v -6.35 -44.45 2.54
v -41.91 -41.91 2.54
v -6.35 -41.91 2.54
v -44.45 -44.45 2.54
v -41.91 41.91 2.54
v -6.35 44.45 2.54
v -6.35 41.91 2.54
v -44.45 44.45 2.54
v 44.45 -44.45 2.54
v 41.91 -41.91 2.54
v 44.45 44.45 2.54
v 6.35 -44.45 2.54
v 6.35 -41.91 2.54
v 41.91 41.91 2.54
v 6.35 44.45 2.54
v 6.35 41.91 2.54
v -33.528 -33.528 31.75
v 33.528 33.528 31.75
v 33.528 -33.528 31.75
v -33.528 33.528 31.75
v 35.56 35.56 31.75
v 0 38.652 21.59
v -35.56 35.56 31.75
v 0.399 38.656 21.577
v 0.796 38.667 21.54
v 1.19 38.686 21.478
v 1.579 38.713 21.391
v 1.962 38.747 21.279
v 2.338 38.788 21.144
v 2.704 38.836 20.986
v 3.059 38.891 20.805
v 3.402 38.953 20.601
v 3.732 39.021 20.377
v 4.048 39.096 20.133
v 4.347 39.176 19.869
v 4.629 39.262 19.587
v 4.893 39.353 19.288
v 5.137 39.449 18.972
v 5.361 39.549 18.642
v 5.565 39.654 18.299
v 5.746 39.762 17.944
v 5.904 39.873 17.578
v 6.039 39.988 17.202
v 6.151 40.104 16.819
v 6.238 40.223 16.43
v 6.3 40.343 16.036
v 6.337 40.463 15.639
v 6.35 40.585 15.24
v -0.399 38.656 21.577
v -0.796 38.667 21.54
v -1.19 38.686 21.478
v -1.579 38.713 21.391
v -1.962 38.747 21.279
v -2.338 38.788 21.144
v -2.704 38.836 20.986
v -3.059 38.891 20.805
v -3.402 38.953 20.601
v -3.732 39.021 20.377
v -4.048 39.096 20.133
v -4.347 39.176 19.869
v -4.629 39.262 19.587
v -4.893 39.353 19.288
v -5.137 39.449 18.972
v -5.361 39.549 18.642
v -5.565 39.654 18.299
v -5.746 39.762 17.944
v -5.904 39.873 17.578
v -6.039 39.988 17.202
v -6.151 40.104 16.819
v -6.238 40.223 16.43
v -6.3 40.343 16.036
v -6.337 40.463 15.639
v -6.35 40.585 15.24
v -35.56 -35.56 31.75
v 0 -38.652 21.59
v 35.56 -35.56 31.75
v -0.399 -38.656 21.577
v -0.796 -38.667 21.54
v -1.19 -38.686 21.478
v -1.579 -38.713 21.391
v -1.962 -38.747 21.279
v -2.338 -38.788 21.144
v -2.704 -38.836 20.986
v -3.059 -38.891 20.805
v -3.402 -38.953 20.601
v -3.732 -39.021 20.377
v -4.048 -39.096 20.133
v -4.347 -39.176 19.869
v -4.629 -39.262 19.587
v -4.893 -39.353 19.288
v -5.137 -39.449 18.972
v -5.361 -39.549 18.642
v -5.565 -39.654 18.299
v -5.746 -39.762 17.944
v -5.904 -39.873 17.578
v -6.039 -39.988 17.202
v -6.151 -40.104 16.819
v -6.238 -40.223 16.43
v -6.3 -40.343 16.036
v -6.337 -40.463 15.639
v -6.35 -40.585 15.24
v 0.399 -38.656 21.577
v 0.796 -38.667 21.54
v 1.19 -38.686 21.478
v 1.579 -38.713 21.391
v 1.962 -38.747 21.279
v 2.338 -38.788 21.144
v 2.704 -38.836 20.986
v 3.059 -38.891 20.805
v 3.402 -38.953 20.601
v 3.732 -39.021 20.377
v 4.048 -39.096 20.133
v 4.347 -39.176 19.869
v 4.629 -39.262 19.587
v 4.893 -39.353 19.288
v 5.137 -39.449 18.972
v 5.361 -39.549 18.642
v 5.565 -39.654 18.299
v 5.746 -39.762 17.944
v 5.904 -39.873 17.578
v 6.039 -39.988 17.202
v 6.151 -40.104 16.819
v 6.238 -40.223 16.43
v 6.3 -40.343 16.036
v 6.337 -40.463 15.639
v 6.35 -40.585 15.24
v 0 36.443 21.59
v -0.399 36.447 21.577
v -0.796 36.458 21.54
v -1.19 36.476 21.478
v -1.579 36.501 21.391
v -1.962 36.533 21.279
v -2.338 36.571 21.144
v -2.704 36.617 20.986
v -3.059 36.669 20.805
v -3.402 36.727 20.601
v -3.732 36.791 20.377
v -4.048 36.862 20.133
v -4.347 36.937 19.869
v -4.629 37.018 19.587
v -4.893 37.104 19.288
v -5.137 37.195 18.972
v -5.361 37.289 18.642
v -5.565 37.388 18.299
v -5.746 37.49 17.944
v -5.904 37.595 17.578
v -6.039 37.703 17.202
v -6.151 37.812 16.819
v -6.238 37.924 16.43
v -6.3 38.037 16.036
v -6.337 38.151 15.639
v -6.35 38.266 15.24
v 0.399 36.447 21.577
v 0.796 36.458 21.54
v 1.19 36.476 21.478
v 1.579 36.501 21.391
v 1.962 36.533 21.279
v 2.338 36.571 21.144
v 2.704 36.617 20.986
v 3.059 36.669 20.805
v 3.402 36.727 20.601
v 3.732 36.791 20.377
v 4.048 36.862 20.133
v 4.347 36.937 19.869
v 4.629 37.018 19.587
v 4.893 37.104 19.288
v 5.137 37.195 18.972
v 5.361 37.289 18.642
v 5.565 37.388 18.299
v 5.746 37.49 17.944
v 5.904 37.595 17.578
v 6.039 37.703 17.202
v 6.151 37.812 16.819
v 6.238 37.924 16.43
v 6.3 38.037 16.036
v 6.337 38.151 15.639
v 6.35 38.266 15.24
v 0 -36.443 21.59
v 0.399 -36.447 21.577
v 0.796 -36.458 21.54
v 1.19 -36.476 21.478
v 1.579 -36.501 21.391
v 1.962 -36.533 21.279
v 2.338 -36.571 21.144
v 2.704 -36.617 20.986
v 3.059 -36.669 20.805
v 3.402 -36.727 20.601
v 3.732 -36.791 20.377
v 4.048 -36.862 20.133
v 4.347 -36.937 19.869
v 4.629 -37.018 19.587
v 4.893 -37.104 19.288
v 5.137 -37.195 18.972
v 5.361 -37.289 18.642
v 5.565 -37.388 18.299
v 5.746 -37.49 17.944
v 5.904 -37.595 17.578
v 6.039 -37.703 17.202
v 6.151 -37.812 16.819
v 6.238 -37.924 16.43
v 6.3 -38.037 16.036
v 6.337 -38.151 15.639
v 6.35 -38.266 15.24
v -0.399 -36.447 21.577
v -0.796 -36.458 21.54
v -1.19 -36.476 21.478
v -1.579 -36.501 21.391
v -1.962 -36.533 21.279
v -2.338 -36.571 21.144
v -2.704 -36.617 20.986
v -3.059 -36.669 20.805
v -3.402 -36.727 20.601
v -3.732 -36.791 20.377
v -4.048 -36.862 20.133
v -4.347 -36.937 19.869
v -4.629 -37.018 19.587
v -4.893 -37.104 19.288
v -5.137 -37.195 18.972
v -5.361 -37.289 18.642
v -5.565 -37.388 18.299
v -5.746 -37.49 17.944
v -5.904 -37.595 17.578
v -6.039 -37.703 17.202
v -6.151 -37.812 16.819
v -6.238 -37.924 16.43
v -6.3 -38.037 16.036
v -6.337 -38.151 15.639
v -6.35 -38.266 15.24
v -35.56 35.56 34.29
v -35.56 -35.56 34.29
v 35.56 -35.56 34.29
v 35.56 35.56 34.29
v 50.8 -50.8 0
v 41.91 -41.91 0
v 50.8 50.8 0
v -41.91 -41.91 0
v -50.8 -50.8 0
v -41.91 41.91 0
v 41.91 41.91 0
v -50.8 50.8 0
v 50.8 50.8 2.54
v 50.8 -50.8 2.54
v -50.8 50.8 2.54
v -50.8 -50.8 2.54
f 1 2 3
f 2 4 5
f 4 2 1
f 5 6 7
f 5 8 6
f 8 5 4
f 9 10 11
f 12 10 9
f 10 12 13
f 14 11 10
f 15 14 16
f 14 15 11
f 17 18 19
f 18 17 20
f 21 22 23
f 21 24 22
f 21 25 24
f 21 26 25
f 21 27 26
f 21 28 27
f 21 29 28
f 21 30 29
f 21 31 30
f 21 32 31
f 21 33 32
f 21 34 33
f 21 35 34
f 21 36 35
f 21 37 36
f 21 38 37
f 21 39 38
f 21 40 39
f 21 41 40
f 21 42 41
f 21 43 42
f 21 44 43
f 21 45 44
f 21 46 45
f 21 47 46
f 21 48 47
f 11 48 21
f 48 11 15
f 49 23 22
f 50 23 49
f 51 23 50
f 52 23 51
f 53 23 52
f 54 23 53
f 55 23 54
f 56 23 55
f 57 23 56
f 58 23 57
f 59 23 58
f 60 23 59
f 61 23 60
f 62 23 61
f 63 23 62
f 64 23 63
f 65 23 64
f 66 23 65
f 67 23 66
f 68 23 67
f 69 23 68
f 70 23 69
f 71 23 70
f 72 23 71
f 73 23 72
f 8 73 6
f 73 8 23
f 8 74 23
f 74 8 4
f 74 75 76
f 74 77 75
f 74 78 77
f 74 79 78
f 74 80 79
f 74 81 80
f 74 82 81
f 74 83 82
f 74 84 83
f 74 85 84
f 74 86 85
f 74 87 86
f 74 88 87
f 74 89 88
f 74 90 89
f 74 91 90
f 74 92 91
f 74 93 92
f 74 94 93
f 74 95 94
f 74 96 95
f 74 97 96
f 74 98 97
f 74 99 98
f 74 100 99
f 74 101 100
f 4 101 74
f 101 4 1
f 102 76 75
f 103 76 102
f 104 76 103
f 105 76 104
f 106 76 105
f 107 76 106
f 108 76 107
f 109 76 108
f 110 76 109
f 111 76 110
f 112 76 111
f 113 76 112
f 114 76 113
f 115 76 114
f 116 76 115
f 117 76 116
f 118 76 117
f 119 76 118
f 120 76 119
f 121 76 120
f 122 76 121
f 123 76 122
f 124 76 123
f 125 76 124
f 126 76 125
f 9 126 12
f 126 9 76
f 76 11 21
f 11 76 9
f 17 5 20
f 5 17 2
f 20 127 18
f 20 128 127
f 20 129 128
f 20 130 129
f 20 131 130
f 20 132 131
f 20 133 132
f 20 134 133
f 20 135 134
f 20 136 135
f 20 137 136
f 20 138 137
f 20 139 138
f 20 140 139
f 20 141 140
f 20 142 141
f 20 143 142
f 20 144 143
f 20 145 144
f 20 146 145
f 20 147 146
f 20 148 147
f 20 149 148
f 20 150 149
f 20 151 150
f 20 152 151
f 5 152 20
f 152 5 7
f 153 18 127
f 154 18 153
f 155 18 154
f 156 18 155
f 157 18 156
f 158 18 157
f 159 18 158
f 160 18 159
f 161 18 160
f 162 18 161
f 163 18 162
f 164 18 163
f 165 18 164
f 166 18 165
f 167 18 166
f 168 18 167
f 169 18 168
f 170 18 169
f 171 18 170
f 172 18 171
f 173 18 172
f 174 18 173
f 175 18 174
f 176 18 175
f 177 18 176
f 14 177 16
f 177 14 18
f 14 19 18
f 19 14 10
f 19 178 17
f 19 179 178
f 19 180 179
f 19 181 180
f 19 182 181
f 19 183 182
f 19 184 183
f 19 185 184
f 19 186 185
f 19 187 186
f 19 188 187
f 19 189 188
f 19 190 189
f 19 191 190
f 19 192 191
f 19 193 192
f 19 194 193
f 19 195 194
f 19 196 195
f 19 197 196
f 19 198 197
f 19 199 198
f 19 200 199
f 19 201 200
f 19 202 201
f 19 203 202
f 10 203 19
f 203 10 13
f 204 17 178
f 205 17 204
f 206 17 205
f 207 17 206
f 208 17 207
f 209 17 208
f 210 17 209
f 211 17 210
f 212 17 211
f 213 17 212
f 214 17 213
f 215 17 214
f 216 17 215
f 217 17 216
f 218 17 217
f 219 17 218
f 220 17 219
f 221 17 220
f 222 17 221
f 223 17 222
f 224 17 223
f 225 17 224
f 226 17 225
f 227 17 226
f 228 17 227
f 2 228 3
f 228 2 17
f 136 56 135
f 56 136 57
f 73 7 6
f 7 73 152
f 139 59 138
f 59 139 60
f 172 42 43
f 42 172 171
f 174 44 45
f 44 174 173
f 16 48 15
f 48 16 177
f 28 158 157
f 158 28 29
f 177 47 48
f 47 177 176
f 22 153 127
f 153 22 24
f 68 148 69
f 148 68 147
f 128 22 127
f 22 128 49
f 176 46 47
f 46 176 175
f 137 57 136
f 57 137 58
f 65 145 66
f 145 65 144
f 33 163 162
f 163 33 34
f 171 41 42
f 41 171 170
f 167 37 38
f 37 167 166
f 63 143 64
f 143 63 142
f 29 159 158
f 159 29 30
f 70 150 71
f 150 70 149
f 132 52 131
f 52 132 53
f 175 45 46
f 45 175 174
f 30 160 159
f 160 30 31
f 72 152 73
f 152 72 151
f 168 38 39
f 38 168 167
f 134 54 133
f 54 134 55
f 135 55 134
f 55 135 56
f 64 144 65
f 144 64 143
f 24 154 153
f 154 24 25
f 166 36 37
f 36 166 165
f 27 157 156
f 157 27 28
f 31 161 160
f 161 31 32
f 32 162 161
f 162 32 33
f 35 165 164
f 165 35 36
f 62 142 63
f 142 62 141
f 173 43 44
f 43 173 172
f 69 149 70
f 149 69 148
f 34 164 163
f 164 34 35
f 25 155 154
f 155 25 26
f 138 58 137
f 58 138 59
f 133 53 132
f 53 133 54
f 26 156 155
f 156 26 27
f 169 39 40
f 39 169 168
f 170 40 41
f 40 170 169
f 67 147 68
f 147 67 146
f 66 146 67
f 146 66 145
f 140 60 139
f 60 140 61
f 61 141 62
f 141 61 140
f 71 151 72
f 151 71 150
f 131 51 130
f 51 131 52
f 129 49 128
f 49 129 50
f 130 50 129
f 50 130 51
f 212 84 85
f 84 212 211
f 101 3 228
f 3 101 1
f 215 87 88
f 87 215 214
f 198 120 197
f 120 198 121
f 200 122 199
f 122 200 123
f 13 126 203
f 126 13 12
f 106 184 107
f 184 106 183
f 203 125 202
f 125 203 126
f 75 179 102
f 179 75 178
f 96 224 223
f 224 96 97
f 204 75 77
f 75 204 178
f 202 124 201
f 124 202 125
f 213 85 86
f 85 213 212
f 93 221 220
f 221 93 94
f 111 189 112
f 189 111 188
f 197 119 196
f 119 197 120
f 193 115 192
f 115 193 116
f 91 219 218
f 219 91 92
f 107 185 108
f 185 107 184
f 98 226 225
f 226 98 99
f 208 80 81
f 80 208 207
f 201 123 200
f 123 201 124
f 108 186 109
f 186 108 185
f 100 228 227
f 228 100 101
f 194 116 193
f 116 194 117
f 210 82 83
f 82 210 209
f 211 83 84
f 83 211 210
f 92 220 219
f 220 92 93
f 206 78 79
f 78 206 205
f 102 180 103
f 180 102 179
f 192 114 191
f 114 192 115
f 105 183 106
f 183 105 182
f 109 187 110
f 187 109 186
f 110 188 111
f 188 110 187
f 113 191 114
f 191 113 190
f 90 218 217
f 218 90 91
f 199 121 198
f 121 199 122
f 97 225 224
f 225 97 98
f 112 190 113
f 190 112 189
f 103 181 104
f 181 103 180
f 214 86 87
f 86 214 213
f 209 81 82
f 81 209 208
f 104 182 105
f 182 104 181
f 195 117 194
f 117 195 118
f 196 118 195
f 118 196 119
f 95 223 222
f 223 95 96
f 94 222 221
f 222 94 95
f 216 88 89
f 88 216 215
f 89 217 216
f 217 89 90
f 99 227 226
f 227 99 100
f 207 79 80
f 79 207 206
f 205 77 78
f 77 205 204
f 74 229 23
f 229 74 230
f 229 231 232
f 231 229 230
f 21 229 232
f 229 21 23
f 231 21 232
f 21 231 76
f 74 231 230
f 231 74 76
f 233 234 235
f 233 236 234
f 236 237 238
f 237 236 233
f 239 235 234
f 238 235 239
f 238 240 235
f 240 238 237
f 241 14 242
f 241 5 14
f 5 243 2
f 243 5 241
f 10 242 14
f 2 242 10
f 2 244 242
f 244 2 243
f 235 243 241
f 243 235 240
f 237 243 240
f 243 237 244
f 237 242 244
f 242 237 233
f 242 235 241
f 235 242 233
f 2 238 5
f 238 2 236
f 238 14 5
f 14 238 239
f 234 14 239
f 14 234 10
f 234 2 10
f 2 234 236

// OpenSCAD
// file: constants.scad
/* GENERAL */

UNIT = 25.4; // 25.4 for in - 1 for mm
$FN = 100;

/* COVER */

COVER_BASE_WIDTH = 4 * UNIT;
COVER_BASE_LENGTH = 4 * UNIT;
COVER_BASE_THICKNESS = 0.1 * UNIT;

COVER_HEIGHT = 1.25 * UNIT;
COVER_TOP_SCALE = 0.8;

COVER_HORIZONTAL_PADDING = 0.5 * UNIT;
COVER_VERTICAL_PADDING = 0.5 * UNIT;

/* LEVEL */

LEVEL_HORIZONTAL_PADDING = 0.5 * UNIT;
LEVEl_VERTICAL_PADDING = 0.5 * UNIT;

/* RISERS */

RISER_LENGTH = LEVEl_VERTICAL_PADDING;
// main file
include <constants.scad>;

module cover_shape(w, l) {
  resize([w, l]) {
    square([1, 1], center=true);
    *circle(d=1, center=true, $fn=$FN);
  }
}

module cover_base(w, l, t, iw, il, it) {
  translate([0, 0, t/2]) linear_extrude(t, center=true) difference() {
    square([w, l], center=true);
    cover_shape(iw-2*it, il-2*it, t);
  }
}

module cover_slot(w, l, h) {
  rotate(a=90, v=[1, 0, 0]) linear_extrude(h, center=true) translate([-w/2, 0, 0]) hull() {
    square([w, l/2]);
    translate([w/2, (l-w/2), 0]) circle(d=w, $fn=$FN);
  }
}

module cover_mid(ow, ol, wt, h, scale) {
  linear_extrude(h, scale=scale) {
    difference() {
      cover_shape(ow, ol);
      offset(r=-wt) cover_shape(ow, ol);
    }
  }
}

module cover_top(iw, il, ot, ih, is) {
  translate([0, 0, ih]) linear_extrude(ot) cover_shape(iw*is, il*is);
}

/*
Generates the `cover` part of the esc enclosure assembly.

@param    decimal   ow    the outer width (bounding box) of cover
@param    decimal   ol    the outer length (bounding box) of cover
@param    decimal   ihp   the inner horizontal padding of cover
@param    decimal   ivp   the inner vertical padding of cover
@param    decimal   oh    the outer height of the entire cover
@param    decimal   ts    the scale of the top part
*/
module cover(ow, ol, ot, ihp, ivp, oh, ts) {
  iw = ow - ihp;
  il = ol - ivp;
  ih = oh - ot;
  union() {
    // build base
    cover_base(ow, ol, ot, iw, il, ot);
    
    // build top
    translate([0, 0, ot]) {
      difference() {
        // build sloped middle
        cover_mid(iw, il, ot, ih, ts);
        
        translate([0, il/2, 0])   cover_slot(0.5 * UNIT, 0.75 * UNIT, 20);
        translate([0, -il/2, 0])  cover_slot(0.5 * UNIT, 0.75 * UNIT, 20);
      }
      
      // build top cover
      cover_top(iw, il, ot, ih, ts);
    }
  }
}


cover(
  ow=COVER_BASE_WIDTH,
  ol=COVER_BASE_LENGTH,
  ot=COVER_BASE_THICKNESS,
  ihp=COVER_HORIZONTAL_PADDING,
  ivp=COVER_VERTICAL_PADDING,
  oh=COVER_HEIGHT,
  ts=COVER_TOP_SCALE
);
